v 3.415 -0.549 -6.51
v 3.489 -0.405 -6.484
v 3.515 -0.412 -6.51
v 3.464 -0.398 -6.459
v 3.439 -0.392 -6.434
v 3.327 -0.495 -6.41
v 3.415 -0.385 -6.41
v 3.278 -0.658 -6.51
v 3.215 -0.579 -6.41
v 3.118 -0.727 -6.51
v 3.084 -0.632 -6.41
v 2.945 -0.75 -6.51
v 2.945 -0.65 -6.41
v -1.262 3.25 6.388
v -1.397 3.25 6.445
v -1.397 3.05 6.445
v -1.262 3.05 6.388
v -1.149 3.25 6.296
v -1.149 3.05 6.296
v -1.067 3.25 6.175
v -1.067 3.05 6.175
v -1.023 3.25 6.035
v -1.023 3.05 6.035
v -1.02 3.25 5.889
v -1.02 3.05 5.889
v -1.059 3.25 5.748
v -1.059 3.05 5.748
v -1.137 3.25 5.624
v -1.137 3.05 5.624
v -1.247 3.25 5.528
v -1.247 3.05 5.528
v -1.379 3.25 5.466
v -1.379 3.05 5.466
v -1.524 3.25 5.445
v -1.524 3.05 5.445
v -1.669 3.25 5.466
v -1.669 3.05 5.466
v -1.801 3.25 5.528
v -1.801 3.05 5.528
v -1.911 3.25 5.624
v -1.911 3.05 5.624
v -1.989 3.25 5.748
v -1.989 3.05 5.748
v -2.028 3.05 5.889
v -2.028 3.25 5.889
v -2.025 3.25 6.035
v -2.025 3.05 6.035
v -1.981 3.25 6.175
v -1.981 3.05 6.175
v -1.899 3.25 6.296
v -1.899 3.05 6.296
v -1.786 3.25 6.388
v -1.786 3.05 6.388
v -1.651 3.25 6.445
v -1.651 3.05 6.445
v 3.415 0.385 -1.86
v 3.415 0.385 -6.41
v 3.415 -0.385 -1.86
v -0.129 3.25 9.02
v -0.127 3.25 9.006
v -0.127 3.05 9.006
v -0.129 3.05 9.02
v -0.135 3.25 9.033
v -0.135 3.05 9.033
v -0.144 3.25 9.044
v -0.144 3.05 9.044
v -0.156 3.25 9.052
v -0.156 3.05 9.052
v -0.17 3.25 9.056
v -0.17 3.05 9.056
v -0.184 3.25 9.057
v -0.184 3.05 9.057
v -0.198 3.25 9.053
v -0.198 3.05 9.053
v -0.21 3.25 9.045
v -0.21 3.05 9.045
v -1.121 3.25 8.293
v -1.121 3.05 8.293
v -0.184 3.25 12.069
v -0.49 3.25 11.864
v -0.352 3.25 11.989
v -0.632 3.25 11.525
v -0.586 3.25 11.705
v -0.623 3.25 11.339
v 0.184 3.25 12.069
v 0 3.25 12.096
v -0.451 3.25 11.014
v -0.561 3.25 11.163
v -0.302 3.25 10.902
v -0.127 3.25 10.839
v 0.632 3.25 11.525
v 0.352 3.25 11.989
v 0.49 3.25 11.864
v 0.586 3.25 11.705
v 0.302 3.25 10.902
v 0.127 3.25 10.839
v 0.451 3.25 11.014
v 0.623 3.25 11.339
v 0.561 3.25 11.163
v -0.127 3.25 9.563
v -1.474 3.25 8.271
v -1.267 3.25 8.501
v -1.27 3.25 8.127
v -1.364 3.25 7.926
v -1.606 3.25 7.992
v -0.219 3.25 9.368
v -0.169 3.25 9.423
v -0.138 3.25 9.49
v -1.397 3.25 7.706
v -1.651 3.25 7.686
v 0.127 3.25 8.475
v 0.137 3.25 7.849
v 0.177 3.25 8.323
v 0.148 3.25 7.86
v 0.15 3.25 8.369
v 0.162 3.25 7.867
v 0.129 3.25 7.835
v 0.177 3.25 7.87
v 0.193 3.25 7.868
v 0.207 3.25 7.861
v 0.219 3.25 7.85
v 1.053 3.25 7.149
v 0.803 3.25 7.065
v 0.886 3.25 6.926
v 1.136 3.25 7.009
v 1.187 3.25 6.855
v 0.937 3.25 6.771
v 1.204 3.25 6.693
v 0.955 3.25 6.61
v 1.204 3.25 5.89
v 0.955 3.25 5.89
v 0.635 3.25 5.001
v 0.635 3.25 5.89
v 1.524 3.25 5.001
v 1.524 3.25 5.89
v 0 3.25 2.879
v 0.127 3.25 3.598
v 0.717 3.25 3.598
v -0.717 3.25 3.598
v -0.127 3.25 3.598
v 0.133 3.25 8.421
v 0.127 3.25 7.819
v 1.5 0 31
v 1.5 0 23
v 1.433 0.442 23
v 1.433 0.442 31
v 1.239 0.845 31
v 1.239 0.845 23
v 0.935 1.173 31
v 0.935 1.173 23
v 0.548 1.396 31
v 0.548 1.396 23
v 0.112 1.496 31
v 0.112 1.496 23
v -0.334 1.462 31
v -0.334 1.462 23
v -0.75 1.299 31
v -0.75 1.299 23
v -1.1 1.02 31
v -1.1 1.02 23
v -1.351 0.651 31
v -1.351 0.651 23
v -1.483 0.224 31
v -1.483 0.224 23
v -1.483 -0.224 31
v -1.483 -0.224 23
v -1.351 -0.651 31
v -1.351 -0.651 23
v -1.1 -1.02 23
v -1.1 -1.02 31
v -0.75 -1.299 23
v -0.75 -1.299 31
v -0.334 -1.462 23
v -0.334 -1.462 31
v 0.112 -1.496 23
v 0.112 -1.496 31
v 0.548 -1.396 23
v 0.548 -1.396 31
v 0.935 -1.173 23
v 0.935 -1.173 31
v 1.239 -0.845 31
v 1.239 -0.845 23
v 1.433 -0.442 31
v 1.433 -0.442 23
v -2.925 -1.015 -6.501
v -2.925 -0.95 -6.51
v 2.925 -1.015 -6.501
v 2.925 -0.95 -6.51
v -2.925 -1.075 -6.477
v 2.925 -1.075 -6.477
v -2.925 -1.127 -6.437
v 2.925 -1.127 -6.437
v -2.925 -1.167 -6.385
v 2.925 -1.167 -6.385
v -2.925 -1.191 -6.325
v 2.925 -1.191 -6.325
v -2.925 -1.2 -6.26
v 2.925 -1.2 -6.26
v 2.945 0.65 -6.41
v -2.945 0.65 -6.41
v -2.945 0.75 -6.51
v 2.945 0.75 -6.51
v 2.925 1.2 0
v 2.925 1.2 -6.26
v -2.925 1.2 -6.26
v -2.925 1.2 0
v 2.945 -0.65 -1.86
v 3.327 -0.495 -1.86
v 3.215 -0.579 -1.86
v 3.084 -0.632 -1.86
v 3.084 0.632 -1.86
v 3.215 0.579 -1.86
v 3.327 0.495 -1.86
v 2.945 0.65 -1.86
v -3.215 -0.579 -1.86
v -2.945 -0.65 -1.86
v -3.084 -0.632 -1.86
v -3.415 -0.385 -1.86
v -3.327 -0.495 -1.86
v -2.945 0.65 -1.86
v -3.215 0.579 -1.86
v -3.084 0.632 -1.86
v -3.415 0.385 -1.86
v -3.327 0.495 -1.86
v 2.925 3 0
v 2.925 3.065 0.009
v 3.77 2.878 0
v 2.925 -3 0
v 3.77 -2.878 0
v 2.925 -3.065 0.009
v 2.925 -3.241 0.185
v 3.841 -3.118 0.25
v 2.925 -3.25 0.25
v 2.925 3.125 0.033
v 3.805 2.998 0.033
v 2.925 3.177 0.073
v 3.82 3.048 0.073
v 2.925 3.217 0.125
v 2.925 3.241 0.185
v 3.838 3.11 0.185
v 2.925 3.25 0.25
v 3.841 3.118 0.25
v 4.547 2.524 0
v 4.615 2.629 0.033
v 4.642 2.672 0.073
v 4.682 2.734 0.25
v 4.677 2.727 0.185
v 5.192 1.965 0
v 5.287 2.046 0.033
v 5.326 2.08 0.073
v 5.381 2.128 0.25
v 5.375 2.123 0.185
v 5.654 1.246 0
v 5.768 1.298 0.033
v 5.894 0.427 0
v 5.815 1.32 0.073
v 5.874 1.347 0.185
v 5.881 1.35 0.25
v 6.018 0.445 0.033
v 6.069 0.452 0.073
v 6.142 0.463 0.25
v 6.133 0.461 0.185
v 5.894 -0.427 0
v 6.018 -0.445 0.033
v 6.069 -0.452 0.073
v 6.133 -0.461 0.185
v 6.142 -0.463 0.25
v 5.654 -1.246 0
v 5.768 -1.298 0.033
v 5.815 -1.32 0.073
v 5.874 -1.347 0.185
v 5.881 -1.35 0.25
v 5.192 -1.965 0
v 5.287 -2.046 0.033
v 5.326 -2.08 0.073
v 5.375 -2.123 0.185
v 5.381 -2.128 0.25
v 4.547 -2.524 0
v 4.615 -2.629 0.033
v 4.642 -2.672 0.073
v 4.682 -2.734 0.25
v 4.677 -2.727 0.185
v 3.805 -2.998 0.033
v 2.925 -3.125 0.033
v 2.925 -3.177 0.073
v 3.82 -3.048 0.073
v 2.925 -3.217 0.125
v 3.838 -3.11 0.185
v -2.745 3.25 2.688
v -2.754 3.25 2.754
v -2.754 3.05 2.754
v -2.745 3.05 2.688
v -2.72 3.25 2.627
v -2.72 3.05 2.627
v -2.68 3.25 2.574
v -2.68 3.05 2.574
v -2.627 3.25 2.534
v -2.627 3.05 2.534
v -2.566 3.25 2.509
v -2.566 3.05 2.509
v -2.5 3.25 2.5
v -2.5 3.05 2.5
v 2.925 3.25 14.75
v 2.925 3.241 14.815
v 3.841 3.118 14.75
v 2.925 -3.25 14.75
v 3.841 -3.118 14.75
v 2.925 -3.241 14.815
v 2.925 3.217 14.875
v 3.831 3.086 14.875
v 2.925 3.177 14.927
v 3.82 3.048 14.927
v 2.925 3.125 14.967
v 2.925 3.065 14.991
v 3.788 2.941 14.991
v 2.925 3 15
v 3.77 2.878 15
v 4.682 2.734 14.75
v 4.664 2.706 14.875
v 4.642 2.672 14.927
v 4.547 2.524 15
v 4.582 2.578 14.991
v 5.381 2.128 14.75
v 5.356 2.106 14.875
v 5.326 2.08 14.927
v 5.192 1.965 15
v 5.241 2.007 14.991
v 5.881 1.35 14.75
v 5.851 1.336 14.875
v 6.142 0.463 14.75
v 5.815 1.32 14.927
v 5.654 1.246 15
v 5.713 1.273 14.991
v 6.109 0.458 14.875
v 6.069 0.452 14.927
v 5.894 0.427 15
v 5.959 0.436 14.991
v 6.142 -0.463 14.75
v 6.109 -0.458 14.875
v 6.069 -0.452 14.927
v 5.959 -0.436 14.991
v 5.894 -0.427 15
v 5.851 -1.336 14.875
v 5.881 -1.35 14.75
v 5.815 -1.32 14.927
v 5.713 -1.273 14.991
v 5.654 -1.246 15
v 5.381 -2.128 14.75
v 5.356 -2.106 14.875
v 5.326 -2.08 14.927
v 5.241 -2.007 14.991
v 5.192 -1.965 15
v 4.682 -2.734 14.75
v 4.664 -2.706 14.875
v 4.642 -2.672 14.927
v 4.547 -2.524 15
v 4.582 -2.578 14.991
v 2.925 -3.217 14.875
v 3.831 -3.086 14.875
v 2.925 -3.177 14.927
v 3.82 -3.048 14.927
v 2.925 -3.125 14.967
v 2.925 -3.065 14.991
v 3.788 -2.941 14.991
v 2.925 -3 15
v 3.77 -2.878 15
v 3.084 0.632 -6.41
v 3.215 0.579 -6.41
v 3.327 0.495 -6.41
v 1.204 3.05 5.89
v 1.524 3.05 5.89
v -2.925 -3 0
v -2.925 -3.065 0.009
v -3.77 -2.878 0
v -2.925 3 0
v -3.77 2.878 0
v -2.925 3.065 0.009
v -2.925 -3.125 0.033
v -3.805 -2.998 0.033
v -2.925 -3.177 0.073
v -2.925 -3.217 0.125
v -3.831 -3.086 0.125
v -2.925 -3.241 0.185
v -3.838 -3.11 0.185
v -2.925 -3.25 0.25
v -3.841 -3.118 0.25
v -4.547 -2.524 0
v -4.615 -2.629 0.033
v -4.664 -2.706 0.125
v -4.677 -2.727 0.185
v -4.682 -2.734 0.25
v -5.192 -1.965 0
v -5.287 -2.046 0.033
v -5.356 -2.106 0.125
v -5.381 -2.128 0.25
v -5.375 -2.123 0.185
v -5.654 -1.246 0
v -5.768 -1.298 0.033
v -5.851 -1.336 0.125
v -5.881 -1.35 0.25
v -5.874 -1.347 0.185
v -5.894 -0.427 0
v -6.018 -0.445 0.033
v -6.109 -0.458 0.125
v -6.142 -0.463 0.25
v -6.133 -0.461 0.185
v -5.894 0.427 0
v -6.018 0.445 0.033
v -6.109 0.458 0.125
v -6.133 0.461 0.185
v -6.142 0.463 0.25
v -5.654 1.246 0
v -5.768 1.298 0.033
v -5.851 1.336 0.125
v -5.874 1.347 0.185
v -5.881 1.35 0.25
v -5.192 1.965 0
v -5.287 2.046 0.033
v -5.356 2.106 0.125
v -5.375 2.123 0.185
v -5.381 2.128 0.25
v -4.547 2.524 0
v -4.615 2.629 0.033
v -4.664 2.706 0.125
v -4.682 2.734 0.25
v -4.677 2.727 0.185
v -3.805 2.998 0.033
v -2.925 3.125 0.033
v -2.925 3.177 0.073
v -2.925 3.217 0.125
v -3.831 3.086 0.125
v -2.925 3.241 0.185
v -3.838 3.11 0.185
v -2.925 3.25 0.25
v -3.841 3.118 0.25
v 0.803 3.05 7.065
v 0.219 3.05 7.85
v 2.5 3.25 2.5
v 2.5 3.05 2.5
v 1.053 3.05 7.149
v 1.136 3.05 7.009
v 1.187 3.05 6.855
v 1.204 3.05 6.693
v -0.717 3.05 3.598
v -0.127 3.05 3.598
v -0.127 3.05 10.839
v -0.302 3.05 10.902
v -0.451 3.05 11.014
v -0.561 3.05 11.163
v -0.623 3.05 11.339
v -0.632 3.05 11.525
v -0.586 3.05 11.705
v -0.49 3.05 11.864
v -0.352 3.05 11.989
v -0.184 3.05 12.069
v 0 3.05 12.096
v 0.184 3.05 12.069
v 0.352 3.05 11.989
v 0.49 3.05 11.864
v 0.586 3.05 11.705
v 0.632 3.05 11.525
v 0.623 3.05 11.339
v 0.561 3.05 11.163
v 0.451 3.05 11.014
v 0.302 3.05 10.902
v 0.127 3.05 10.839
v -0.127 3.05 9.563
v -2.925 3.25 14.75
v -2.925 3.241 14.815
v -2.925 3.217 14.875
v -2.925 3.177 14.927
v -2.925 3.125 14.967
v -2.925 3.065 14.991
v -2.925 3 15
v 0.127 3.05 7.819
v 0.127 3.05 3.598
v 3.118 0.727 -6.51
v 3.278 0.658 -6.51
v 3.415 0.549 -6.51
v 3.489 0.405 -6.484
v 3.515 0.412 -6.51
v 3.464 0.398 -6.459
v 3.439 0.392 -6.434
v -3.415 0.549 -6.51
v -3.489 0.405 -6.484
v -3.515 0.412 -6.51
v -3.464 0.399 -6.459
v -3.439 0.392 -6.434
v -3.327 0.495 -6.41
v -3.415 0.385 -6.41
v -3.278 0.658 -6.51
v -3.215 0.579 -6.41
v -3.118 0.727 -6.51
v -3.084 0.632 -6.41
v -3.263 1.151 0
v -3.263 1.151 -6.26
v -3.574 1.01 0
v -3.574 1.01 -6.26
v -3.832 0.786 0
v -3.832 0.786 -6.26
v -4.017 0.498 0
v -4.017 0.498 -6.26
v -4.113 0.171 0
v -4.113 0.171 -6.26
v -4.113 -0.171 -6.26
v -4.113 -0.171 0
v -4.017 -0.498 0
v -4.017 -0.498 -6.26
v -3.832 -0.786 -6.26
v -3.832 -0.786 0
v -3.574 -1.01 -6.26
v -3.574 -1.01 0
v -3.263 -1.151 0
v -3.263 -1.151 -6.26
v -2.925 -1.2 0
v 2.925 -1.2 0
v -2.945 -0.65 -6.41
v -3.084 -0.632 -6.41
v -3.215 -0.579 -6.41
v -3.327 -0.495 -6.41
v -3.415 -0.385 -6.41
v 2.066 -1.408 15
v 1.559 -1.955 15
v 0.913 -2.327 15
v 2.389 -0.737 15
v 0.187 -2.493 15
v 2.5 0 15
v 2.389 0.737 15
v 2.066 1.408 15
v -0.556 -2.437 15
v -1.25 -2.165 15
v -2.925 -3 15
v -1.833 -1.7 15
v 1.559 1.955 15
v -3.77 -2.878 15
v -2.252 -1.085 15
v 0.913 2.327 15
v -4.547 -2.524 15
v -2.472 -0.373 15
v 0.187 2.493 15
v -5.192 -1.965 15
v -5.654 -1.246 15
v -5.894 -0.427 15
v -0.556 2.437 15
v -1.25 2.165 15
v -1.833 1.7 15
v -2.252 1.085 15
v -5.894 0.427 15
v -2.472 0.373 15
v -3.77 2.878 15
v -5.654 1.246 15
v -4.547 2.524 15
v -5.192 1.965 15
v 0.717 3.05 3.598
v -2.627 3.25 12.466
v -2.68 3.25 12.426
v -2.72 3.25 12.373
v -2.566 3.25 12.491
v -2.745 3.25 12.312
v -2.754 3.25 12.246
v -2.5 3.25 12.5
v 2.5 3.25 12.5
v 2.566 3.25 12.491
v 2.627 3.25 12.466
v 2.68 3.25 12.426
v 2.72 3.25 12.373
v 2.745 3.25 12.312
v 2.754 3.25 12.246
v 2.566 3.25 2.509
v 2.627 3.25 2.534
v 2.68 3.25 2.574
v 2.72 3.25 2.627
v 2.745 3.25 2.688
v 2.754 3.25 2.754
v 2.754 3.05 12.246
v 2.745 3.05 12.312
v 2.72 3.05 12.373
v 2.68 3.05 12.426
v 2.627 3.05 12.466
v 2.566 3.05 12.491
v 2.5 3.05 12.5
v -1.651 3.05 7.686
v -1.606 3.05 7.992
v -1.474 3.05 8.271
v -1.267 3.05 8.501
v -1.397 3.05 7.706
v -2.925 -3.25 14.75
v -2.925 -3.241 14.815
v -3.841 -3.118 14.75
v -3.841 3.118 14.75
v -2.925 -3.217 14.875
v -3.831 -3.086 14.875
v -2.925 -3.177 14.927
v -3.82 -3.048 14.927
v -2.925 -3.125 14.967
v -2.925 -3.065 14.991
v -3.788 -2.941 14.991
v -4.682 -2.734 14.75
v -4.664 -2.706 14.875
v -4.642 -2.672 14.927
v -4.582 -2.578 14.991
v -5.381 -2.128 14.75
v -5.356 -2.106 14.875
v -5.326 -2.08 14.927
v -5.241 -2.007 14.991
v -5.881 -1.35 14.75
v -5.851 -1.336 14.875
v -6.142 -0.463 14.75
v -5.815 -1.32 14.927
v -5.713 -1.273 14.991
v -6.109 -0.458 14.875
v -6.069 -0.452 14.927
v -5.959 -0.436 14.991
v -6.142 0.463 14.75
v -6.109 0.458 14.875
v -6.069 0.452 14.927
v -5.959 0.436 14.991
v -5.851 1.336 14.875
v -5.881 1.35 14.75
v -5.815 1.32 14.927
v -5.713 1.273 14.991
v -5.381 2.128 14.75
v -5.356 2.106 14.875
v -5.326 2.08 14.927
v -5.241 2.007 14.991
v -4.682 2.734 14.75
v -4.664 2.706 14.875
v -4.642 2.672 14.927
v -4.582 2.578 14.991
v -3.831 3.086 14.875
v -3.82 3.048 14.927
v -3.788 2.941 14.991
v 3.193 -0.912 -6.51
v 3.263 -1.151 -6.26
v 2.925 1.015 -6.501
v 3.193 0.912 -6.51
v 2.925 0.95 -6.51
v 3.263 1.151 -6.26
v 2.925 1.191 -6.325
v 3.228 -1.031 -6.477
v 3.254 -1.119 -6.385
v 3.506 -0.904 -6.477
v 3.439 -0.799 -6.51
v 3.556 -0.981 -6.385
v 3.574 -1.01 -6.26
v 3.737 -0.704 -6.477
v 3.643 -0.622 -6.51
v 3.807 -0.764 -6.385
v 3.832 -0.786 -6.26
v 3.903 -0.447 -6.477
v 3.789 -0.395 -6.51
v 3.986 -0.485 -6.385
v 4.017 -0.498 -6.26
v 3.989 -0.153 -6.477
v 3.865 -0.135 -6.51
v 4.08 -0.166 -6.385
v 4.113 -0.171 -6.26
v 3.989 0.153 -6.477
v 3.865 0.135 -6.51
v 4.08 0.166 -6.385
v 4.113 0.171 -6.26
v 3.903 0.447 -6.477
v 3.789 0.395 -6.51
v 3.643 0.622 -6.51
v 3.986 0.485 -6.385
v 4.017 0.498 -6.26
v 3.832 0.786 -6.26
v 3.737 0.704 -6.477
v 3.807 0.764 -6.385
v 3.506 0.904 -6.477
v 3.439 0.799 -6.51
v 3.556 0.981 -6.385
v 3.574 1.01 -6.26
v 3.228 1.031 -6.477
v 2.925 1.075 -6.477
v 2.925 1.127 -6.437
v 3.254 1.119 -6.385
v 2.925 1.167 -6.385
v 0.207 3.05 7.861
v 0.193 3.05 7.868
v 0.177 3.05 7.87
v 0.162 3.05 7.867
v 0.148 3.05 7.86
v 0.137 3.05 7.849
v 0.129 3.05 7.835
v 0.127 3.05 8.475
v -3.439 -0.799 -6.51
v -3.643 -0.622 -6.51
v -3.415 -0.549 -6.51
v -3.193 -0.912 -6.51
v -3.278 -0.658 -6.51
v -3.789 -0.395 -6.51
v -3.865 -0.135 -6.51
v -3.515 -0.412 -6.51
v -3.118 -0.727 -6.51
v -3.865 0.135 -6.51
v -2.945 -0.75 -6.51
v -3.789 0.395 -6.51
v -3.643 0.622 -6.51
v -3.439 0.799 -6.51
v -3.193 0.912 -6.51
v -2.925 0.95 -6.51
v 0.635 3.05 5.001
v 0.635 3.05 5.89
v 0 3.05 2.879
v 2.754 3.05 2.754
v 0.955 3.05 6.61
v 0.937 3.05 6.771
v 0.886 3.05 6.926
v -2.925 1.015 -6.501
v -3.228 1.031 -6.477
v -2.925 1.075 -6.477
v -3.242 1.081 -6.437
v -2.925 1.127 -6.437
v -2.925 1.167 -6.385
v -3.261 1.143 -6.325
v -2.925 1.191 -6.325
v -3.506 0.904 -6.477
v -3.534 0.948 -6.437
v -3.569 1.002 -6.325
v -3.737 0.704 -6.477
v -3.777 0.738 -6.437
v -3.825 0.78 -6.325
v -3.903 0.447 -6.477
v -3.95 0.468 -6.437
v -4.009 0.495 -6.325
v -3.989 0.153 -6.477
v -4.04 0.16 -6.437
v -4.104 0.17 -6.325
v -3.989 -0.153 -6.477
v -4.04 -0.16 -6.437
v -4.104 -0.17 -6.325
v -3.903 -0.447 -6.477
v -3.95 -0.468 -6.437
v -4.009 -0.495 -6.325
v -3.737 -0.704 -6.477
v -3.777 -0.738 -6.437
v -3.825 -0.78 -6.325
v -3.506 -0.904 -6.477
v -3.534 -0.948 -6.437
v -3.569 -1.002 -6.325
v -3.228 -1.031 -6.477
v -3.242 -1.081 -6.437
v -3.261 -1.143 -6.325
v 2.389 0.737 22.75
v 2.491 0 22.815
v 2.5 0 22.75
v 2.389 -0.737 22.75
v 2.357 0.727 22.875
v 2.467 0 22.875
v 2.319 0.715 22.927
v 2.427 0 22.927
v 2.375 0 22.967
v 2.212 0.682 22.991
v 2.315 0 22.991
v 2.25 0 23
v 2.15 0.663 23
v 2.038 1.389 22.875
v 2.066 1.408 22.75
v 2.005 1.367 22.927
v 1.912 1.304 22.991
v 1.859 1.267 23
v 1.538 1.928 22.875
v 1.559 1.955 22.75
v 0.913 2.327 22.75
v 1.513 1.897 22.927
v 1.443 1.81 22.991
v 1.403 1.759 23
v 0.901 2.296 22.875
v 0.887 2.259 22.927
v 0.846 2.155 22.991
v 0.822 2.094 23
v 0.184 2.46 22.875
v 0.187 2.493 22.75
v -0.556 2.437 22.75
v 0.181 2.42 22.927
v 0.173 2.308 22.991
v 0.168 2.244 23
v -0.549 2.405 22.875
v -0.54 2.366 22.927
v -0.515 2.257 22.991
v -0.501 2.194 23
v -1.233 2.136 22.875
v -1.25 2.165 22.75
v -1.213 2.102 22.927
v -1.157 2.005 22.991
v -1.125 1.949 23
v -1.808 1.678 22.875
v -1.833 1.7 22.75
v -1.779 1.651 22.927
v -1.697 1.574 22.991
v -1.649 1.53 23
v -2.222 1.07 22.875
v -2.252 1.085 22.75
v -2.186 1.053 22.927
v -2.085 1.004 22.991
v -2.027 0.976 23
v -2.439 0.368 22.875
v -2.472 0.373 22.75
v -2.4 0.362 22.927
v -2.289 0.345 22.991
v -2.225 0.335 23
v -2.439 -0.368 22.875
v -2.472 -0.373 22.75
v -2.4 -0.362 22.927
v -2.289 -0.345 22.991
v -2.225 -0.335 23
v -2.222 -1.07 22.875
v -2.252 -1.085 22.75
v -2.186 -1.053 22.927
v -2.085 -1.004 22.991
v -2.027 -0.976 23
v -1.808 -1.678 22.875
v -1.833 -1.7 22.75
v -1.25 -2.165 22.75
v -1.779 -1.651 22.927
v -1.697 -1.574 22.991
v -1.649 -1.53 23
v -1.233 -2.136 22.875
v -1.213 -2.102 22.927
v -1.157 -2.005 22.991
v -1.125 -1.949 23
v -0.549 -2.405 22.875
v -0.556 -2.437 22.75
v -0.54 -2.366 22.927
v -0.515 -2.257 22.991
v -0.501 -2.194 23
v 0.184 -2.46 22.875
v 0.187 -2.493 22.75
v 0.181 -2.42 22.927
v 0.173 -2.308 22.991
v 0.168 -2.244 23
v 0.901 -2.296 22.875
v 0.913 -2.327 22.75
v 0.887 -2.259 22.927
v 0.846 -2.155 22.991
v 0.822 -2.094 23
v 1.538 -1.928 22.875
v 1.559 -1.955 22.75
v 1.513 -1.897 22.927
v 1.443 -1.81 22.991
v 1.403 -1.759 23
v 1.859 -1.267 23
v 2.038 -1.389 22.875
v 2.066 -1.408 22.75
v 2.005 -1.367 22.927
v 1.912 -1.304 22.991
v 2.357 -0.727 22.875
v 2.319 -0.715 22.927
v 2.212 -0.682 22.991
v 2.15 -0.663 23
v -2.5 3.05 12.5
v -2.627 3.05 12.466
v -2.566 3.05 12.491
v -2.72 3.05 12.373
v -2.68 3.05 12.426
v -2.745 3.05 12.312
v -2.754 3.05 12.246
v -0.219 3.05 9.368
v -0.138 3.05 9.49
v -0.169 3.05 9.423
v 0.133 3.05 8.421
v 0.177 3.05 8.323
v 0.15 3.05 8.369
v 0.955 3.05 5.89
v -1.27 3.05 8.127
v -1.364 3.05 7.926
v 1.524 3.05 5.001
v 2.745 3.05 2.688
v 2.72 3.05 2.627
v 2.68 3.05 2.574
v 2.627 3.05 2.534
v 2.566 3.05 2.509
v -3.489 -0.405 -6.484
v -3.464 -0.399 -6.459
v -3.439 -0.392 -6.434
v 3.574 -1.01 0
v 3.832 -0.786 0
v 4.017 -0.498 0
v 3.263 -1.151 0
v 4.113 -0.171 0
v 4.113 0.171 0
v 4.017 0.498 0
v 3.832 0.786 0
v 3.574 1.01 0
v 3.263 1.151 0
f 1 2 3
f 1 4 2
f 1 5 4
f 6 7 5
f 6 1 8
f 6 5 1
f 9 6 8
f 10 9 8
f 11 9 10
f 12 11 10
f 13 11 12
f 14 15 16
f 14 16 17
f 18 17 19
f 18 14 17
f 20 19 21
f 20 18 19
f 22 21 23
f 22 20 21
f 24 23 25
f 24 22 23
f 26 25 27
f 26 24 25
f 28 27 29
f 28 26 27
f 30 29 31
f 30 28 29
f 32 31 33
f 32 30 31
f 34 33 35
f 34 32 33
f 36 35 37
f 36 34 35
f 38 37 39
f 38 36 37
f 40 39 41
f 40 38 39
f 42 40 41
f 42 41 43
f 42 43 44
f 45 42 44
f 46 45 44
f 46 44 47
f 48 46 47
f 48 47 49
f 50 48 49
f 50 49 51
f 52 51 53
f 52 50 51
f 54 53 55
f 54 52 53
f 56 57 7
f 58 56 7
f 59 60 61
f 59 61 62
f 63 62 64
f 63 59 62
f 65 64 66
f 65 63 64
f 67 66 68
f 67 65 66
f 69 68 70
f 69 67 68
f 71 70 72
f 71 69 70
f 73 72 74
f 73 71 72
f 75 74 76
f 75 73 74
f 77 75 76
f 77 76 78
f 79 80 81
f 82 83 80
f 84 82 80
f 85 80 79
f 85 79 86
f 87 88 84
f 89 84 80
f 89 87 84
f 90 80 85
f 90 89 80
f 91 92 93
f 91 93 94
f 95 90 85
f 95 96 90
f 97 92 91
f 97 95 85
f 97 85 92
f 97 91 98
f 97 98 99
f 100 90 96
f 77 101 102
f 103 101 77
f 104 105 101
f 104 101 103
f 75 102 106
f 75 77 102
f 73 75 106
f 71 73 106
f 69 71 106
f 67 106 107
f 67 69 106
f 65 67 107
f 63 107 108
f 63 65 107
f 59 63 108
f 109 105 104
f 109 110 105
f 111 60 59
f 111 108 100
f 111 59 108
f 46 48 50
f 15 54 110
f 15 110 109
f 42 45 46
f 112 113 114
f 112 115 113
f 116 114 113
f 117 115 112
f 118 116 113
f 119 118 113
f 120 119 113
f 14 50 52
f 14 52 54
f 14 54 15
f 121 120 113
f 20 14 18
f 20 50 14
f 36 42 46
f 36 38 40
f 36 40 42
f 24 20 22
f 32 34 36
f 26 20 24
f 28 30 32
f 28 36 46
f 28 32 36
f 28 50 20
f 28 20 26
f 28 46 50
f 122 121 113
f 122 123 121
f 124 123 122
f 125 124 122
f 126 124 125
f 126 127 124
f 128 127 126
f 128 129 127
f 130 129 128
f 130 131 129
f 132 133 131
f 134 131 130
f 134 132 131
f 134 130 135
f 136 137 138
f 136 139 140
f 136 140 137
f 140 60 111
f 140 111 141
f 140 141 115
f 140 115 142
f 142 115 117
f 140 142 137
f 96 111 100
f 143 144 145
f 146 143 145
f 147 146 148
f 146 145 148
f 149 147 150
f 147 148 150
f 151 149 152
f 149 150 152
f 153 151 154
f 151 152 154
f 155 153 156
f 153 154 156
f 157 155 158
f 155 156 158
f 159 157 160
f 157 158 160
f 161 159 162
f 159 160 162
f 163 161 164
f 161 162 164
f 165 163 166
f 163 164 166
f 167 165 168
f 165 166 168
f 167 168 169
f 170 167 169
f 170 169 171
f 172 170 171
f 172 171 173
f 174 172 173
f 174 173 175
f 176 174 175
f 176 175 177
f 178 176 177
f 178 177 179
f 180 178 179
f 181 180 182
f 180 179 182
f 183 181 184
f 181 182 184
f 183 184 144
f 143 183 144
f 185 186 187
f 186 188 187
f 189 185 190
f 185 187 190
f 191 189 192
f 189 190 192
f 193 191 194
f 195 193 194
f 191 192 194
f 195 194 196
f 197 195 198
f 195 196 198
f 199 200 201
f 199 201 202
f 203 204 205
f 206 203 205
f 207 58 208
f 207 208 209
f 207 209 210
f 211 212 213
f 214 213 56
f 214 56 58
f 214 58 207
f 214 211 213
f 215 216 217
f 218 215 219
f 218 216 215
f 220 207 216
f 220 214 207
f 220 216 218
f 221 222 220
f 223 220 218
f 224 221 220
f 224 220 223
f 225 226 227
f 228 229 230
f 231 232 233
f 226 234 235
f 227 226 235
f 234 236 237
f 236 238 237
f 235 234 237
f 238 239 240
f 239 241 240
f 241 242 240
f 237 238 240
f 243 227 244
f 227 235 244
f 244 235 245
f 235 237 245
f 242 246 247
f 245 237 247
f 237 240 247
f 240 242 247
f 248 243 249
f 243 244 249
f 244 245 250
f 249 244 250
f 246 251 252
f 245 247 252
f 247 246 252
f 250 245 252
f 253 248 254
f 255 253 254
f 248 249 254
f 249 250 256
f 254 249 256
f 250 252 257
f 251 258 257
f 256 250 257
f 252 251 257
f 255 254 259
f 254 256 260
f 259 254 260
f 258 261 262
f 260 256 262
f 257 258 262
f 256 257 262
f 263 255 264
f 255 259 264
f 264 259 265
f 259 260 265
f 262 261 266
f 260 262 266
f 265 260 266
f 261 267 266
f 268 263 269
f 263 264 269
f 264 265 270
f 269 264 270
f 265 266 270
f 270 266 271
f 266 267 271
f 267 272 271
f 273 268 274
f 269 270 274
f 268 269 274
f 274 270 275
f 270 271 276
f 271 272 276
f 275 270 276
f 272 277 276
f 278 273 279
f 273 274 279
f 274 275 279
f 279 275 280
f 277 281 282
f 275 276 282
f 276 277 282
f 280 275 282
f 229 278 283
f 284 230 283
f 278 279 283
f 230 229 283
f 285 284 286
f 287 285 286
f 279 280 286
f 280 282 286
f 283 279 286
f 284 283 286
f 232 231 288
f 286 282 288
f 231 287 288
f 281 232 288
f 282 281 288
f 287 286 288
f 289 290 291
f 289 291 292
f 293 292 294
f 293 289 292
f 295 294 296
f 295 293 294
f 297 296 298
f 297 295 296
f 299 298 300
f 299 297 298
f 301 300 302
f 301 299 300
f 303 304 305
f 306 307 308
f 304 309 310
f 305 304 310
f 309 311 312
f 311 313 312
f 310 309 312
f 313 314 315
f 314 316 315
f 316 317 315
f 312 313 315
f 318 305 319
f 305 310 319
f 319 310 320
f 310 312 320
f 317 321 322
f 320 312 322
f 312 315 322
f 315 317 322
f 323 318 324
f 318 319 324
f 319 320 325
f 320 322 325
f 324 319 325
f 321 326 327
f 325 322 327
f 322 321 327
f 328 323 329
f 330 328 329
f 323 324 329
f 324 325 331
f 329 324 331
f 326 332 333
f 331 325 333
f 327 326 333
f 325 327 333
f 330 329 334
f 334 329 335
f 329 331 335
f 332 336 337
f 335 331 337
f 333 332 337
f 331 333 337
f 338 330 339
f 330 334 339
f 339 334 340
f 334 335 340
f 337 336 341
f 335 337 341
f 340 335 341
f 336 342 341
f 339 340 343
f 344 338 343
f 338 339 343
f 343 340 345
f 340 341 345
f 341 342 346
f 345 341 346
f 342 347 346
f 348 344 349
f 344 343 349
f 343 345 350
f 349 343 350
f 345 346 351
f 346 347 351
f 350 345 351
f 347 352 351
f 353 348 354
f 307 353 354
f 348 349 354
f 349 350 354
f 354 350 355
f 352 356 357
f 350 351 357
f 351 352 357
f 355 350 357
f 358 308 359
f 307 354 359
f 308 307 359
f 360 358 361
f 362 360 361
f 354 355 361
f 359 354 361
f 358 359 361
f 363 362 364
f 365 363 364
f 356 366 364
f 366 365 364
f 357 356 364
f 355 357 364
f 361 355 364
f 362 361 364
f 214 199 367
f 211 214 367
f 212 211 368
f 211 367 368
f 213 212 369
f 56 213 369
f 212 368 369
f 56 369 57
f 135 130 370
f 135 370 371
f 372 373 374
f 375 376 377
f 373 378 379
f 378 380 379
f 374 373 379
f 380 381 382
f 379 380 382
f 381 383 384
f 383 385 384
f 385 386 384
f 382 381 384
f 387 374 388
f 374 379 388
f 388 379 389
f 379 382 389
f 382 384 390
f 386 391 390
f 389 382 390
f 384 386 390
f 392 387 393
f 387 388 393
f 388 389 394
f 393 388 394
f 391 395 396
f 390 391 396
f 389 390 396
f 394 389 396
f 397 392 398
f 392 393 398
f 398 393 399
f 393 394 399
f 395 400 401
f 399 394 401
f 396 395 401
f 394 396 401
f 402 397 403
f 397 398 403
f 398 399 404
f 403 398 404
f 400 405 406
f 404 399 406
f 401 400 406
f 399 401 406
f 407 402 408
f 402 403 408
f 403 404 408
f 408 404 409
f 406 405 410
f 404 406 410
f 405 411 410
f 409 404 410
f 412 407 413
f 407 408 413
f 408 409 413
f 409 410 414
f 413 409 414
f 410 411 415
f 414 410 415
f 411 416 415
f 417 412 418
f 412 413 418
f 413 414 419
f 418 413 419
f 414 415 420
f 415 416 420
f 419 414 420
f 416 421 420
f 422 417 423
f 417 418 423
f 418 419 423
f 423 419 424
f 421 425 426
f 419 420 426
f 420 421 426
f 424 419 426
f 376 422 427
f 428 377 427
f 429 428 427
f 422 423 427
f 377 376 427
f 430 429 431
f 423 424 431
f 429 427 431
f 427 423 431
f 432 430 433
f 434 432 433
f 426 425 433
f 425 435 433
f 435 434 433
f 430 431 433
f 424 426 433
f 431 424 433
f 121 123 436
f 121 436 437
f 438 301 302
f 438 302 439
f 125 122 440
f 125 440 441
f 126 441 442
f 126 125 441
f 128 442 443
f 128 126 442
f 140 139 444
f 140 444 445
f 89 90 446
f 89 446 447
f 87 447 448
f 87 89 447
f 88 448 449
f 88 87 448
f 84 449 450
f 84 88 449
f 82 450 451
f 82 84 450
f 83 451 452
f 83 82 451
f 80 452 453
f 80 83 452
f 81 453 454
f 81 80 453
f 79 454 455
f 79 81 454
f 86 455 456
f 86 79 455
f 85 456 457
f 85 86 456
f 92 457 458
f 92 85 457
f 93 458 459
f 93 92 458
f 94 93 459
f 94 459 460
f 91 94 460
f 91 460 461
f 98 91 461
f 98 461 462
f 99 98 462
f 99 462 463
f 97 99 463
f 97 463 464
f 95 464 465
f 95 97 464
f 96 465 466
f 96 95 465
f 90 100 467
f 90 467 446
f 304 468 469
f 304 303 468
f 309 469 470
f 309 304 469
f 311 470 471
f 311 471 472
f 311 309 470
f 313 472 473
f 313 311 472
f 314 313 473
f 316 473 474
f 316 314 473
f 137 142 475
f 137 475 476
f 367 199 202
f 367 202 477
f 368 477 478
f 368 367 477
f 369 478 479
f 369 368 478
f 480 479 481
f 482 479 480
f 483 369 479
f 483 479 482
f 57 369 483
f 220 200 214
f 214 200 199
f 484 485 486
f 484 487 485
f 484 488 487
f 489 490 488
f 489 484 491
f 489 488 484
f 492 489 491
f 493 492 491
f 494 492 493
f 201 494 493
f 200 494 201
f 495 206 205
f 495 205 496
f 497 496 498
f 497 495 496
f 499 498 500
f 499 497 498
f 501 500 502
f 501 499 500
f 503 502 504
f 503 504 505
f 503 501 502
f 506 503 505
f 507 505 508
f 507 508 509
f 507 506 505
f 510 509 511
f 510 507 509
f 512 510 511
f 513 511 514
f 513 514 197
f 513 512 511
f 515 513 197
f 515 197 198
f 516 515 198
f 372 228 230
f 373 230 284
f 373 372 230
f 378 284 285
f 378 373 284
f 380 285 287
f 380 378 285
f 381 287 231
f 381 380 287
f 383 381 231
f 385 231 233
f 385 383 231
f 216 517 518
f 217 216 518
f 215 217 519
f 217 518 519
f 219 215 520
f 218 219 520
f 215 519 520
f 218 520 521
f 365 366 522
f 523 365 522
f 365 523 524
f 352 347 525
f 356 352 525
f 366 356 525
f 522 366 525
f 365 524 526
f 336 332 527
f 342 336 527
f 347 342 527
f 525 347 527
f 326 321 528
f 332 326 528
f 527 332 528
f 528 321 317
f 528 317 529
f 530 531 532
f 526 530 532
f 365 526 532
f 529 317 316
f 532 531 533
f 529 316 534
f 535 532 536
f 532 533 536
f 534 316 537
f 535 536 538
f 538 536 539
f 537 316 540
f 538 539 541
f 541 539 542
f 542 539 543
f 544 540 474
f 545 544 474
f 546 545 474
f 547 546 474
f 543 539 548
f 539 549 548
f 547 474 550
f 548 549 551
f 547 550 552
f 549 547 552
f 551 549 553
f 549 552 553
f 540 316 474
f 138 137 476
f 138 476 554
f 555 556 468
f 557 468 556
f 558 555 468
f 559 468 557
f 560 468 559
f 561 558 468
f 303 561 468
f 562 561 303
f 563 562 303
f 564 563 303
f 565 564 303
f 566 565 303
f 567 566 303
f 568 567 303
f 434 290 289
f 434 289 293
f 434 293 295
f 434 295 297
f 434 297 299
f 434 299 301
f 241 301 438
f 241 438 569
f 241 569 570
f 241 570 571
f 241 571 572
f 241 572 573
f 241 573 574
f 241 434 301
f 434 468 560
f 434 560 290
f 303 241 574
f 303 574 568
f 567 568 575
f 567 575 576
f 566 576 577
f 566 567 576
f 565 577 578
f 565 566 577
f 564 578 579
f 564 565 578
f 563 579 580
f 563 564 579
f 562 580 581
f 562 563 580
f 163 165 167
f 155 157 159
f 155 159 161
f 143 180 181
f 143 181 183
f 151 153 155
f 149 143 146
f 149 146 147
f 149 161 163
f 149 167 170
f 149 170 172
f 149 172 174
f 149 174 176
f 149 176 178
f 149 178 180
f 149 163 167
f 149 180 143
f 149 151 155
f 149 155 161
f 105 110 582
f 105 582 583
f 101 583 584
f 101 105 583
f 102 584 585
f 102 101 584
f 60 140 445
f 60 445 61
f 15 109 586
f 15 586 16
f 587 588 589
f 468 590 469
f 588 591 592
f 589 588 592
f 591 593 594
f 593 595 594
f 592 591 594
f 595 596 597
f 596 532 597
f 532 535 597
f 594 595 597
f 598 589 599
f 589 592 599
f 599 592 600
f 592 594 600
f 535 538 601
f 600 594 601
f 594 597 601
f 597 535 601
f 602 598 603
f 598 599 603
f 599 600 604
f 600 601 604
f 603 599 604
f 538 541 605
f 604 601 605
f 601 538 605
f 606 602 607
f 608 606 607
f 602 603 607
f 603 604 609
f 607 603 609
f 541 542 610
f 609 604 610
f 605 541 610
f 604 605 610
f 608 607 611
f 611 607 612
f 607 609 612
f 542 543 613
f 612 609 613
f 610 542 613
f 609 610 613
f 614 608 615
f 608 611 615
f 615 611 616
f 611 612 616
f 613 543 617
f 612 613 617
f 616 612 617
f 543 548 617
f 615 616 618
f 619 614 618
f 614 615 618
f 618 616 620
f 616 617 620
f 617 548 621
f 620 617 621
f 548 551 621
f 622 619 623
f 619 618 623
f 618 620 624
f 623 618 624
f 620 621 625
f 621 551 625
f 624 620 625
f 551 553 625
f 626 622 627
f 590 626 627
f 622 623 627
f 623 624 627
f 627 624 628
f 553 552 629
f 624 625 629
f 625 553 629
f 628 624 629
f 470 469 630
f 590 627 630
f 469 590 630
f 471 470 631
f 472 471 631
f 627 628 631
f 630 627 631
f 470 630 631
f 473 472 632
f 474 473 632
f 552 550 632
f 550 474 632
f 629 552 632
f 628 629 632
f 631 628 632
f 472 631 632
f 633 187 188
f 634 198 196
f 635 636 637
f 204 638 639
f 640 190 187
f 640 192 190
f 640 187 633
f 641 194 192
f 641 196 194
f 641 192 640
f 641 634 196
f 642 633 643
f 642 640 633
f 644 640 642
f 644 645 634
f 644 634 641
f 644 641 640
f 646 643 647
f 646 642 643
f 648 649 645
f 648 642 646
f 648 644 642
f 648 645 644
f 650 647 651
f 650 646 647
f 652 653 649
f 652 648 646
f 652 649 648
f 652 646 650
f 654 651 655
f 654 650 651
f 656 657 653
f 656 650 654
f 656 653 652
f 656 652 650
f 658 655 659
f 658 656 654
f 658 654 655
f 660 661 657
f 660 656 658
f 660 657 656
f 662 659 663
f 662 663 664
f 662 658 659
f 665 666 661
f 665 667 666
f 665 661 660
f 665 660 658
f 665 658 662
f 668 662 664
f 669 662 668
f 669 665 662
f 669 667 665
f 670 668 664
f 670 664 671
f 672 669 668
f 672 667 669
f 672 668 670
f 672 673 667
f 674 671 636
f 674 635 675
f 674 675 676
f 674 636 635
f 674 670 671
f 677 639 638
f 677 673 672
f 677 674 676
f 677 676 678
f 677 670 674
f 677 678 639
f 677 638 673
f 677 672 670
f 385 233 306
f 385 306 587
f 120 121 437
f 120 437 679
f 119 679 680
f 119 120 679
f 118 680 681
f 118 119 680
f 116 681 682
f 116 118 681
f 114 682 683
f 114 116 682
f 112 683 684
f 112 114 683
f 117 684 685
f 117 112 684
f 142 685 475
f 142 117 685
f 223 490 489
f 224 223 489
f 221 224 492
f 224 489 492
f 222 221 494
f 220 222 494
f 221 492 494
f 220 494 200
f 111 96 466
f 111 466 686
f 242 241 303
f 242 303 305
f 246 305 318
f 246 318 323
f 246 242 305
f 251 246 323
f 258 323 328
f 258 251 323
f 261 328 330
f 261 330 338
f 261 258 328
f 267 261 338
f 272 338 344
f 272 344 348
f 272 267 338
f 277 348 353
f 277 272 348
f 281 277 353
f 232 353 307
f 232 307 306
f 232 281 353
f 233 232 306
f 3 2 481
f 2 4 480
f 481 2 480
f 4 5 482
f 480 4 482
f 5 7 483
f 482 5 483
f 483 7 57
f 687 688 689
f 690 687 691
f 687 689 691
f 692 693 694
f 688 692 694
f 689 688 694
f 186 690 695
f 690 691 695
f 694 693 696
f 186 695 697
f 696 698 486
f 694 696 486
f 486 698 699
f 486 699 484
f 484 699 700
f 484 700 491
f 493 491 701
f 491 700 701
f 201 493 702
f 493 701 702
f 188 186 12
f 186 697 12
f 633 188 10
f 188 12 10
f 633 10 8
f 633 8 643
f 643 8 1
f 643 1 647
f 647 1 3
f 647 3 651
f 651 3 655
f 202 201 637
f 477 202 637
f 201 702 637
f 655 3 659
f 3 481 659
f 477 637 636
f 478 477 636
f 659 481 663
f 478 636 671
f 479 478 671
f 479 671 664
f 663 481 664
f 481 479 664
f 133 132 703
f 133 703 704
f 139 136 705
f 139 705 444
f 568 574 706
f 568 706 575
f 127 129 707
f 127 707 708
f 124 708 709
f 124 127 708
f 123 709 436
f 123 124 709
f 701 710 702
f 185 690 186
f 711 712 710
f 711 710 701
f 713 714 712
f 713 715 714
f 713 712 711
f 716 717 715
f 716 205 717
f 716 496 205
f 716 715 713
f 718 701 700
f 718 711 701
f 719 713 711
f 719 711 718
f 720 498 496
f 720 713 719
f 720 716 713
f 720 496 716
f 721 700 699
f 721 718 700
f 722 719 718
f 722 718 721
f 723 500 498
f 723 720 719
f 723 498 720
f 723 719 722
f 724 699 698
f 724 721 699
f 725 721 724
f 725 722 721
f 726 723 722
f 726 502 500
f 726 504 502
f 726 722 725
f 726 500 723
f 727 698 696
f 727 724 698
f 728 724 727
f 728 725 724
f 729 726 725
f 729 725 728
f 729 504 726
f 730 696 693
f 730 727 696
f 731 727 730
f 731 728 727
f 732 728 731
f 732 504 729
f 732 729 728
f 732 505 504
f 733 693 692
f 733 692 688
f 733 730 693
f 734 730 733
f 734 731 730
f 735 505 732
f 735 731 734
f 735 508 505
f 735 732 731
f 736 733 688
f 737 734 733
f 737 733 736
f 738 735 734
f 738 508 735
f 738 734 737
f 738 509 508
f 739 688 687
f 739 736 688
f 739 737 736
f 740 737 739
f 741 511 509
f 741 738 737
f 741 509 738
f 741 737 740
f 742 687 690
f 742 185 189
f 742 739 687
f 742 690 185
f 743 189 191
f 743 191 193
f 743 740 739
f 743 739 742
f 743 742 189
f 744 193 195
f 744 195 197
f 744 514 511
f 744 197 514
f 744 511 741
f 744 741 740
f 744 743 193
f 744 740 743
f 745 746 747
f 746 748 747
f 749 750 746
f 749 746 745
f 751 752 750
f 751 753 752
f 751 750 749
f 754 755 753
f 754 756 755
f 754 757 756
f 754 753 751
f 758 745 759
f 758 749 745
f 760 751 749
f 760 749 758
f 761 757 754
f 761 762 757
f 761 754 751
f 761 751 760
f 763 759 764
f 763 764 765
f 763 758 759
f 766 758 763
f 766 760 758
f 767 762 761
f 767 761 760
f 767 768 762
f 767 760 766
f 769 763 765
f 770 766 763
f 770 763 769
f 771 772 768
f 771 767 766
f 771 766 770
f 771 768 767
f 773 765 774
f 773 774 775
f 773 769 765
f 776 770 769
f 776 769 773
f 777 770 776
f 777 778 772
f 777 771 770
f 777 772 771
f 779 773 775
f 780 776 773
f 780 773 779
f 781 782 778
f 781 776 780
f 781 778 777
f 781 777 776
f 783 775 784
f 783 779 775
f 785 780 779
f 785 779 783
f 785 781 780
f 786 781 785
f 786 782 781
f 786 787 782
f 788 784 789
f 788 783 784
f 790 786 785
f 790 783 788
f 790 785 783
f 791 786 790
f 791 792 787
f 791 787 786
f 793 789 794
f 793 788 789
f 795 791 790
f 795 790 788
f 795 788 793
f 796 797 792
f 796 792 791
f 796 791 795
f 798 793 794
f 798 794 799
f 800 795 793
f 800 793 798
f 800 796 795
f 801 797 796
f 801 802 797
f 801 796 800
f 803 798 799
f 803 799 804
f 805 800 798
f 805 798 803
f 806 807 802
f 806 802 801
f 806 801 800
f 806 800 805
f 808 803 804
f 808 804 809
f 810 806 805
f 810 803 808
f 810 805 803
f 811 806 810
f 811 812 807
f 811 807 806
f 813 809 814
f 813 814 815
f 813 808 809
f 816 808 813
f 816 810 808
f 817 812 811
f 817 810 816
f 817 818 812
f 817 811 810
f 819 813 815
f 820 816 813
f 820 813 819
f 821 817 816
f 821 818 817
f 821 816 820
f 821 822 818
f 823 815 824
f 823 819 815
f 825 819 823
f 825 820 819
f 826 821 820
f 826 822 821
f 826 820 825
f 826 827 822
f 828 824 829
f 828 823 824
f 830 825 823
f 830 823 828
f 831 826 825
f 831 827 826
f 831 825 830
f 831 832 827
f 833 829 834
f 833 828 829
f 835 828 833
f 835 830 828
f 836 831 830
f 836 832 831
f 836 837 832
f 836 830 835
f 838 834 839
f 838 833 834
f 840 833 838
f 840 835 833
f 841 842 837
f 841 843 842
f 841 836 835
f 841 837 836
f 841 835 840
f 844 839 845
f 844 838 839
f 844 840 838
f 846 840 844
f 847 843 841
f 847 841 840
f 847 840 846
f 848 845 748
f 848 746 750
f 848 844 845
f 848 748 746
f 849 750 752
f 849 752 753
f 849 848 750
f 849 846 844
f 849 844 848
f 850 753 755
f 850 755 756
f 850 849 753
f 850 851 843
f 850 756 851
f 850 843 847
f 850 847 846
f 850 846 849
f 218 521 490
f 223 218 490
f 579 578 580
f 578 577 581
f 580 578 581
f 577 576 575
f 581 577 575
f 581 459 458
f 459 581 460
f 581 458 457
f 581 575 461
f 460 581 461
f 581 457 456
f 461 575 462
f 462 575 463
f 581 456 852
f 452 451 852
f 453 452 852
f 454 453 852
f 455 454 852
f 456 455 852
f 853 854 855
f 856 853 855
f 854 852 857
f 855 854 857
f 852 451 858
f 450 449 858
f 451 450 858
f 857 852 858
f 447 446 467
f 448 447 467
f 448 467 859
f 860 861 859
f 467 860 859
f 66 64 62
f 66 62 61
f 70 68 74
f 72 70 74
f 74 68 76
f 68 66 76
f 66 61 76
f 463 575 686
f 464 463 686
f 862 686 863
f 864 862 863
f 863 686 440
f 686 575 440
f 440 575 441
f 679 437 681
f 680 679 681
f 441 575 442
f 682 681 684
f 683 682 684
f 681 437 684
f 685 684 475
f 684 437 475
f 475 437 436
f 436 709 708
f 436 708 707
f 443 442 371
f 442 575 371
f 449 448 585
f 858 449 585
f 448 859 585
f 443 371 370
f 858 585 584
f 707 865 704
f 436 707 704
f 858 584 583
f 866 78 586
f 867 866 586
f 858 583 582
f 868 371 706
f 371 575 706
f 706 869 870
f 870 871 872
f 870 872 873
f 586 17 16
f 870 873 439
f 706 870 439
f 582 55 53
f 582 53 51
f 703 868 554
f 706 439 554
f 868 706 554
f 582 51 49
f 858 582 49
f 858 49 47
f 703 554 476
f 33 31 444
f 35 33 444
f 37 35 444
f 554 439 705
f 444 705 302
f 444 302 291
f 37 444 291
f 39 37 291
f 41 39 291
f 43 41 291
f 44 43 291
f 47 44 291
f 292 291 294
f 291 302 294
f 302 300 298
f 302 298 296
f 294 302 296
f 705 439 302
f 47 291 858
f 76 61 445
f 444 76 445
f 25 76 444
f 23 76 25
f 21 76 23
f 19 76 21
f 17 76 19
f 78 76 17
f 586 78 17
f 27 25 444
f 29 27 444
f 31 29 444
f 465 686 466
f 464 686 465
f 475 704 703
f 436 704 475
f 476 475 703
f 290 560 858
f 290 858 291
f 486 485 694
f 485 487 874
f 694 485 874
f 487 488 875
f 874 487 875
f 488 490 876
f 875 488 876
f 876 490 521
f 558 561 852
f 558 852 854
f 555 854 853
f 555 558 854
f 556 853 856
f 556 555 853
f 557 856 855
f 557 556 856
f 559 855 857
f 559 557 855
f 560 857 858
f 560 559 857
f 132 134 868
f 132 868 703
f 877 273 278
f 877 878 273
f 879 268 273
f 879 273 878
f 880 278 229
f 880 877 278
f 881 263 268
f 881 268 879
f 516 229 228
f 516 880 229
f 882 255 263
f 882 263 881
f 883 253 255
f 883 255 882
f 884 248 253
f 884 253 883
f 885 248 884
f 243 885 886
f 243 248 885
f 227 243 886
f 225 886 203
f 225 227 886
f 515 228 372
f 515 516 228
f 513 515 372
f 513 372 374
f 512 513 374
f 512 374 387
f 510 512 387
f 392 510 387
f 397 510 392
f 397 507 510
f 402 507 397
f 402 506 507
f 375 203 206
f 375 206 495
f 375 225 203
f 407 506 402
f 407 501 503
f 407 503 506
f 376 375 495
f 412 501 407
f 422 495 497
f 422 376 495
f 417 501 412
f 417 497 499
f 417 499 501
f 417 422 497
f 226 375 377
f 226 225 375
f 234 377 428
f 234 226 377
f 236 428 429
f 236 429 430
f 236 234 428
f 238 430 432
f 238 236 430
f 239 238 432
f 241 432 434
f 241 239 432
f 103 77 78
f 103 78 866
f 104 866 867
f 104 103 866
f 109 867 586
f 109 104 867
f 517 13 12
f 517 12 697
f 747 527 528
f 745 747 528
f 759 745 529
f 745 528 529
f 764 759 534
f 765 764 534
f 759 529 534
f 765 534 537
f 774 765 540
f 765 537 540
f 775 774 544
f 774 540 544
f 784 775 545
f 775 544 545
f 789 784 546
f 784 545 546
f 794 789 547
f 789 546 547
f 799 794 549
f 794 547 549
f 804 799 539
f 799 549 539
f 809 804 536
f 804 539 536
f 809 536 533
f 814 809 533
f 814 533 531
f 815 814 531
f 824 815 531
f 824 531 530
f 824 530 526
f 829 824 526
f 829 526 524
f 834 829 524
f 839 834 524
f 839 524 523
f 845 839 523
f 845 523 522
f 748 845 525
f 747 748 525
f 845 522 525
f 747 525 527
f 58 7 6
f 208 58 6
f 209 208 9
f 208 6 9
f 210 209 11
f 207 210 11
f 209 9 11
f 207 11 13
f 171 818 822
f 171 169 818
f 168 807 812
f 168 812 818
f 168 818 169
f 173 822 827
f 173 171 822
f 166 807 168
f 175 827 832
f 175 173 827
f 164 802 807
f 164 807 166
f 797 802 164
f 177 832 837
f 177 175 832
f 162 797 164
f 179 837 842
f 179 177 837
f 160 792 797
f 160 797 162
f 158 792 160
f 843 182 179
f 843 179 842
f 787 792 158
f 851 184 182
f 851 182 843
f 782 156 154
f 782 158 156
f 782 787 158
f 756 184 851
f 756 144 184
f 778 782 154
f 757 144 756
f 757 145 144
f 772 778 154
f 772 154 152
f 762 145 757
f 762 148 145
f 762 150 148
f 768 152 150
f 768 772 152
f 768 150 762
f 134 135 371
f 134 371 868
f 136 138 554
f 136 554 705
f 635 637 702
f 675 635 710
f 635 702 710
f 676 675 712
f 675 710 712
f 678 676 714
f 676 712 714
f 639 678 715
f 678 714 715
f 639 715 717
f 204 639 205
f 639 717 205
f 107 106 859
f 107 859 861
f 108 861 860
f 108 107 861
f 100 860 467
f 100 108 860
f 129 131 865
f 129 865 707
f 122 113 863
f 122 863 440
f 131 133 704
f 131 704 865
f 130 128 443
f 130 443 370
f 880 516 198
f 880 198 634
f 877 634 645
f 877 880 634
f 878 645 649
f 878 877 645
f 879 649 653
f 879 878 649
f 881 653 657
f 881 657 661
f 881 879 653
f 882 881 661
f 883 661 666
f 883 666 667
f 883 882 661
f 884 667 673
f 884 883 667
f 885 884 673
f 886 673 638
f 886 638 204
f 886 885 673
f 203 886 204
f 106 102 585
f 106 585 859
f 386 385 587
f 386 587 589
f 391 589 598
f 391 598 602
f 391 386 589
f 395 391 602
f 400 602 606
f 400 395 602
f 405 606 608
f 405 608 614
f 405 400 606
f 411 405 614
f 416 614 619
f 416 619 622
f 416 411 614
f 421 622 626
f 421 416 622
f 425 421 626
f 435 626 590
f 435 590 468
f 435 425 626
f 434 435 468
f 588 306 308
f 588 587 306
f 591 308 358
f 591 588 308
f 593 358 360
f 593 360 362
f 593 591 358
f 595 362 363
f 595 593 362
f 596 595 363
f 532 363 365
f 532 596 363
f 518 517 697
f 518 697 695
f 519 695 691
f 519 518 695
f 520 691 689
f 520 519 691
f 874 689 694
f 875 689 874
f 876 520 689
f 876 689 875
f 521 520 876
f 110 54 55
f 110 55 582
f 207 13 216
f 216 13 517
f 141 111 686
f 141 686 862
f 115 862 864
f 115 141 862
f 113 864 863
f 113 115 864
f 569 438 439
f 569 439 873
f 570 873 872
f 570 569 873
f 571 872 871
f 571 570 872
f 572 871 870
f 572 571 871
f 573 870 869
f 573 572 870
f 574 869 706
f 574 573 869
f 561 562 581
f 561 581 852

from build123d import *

# Parameters (mm, degrees)
EXTRUDE_1_DEPTH     = 15
EXTRUDE_2_DEPTH     = 6.51
CUT_EXTRUDE_1_DEPTH = 4.65
CHAMFER_1_SIZE      = 0.1
FILLET_1_R          = 0.25
CUT_EXTRUDE_2_DEPTH = 0.2
SKETCH_5_R          = 2.5
EXTRUDE_3_DEPTH     = 8
FILLET_2_R          = 0.25
SKETCH_6_R          = 1.5
EXTRUDE_4_DEPTH     = 8


with BuildPart() as part:
    # Эскиз1 → Бобышка-Вытянуть1 (new body)
    with BuildSketch(Plane.XY):
        with BuildLine():
            Line((-2.925, 3.25), (2.925, 3.25))
            ThreePointArc((2.925, 3.25), (6.175, 0), (2.925, -3.25))
            Line((2.925, -3.25), (-2.925, -3.25))
            ThreePointArc((-2.925, -3.25), (-6.175, 0), (-2.925, 3.25))
        make_face()
    extrude(amount=EXTRUDE_1_DEPTH)

    # Эскиз2 → Бобышка-Вытянуть2 (add)
    with BuildSketch(Plane(origin=(0, 0, 0), x_dir=(-1, 0, 0), z_dir=(0, 0, -1))):
        with BuildLine():
            Line((-2.925, 1.2), (2.925, 1.2))
            ThreePointArc((2.925, 1.2), (4.125, 0), (2.925, -1.2))
            Line((2.925, -1.2), (-2.925, -1.2))
            ThreePointArc((-2.925, -1.2), (-4.125, 0), (-2.925, 1.2))
        make_face()
    extrude(amount=EXTRUDE_2_DEPTH)

    # Эскиз3 → Вырез-Вытянуть1 (cut)
    with BuildSketch(Plane(origin=(0, 0, -6.51), x_dir=(-1, 0, 0), z_dir=(0, 0, -1))):
        with BuildLine():
            Line((-2.944601233, -0.65), (2.944601233, -0.65))
            ThreePointArc((2.944601233, -0.65), (3.214554933, -0.579192028), (3.415, -0.385))
            Line((3.415, -0.385), (3.415, 0.385))
            ThreePointArc((3.415, 0.385), (3.214554933, 0.579192028), (2.944601233, 0.65))
            Line((2.944601233, 0.65), (-2.944601233, 0.65))
            ThreePointArc((-2.944601233, 0.65), (-3.214554933, 0.579192028), (-3.415, 0.385))
            Line((-3.415, 0.385), (-3.415, -0.385))
            ThreePointArc((-3.415, -0.385), (-3.214554933, -0.579192028), (-2.944601233, -0.65))
        make_face()
    extrude(amount=-CUT_EXTRUDE_1_DEPTH, mode=Mode.SUBTRACT)

    # Фаска1
    chamfer_1_edges = [part.edges().sort_by_distance(p)[0] for p in [
        (3.214554933, -0.579192028, -6.51),
        (-3.214554933, -0.579192028, -6.51),
        (0, -0.65, -6.51),
    ]]
    chamfer(chamfer_1_edges, length=CHAMFER_1_SIZE)
    chamfer_1_2_edges = [part.edges().sort_by_distance(p)[0] for p in [
        (3.214554933, 0.579192028, -6.51),
        (0, 0.65, -6.51),
        (-3.214554933, 0.579192028, -6.51),
    ]]
    chamfer(chamfer_1_2_edges, length=CHAMFER_1_SIZE)
    chamfer_1_3_edges = [part.edges().sort_by_distance(p)[0] for p in [
        (-3.415, 0, -6.51),
    ]]
    chamfer(chamfer_1_3_edges, length=CHAMFER_1_SIZE - 0.0001)  # a hair under: the kernel refuses the full size
    chamfer_1_4_edges = [part.edges().sort_by_distance(p)[0] for p in [
        (3.415, 0, -6.51),
    ]]
    chamfer(chamfer_1_4_edges, length=CHAMFER_1_SIZE)

    # Скругление1
    fillet_1_edges = [part.edges().sort_by_distance(p)[0] for p in [
        (4.125, 0, -6.51),
        (0, -1.2, -6.51),
        (-4.125, 0, -6.51),
        (0, 1.2, -6.51),
    ]]
    fillet(fillet_1_edges, radius=FILLET_1_R)

    # Эскиз4 → Вырез-Вытянуть2 (cut)
    with BuildSketch(Plane(origin=(0, 3.25, 0), x_dir=(1, 0, 0), z_dir=(0, 1, 0))):
        with BuildLine():
            Line((-2.5, -2.5), (2.5, -2.5))
            ThreePointArc((2.5, -2.5), (2.679605122, -2.574394878), (2.754, -2.754))
            Line((2.754, -2.754), (2.754, -12.246))
            ThreePointArc((2.754, -12.246), (2.679605122, -12.425605122), (2.5, -12.5))
            Line((2.5, -12.5), (-2.5, -12.5))
            ThreePointArc((-2.5, -12.5), (-2.679605122, -12.425605122), (-2.754, -12.246))
            Line((-2.754, -12.246), (-2.754, -2.754))
            ThreePointArc((-2.754, -2.754), (-2.679605122, -2.574394878), (-2.5, -2.5))
        make_face()
        with BuildLine():
            Line((0, -2.878550244), (-0.716956191, -3.598432054))
            Line((-0.716956191, -3.598432054), (-0.127, -3.598432054))
            Line((-0.127, -3.598432054), (-0.127, -9.006251958))
            ThreePointArc((-0.127, -9.006251958), (-0.156162493, -9.052213445), (-0.21016765, -9.045405185))
            Line((-0.21016765, -9.045405185), (-1.120514747, -8.292828766))
            ThreePointArc((-1.120514747, -8.292828766), (-1.324422308, -8.030092949), (-1.397, -7.705530349))
            Line((-1.397, -7.705530349), (-1.397, -6.445060748))
            ThreePointArc((-1.397, -6.445060748), (-1.524, -5.445191863), (-1.651, -6.445060748))
            Line((-1.651, -6.445060748), (-1.651, -7.68561956))
            ThreePointArc((-1.651, -7.68561956), (-1.550201428, -8.136384053), (-1.267007097, -8.501281232))
            Line((-1.267007097, -8.501281232), (-0.219161751, -9.367526318))
            ThreePointArc((-0.219161751, -9.367526318), (-0.151192564, -9.455104923), (-0.127, -9.563292457))
            Line((-0.127, -9.563292457), (-0.127, -10.838615444))
            ThreePointArc((-0.127, -10.838615444), (0, -12.095785839), (0.127, -10.838615444))
            Line((0.127, -10.838615444), (0.127, -8.47461517))
            ThreePointArc((0.127, -8.47461517), (0.139930568, -8.394605616), (0.177405738, -8.322742274))
            Line((0.177405738, -8.322742274), (1.053118903, -7.148798926))
            ThreePointArc((1.053118903, -7.148798926), (1.165544414, -6.933208901), (1.204336117, -6.693180239))
            Line((1.204336117, -6.693180239), (1.204336117, -5.889691863))
            Line((1.204336117, -5.889691863), (1.524, -5.889691863))
            Line((1.524, -5.889691863), (1.524, -5.000691863))
            Line((1.524, -5.000691863), (0.635, -5.000691863))
            Line((0.635, -5.000691863), (0.635, -5.889691863))
            Line((0.635, -5.889691863), (0.954663883, -5.889691863))
            Line((0.954663883, -5.889691863), (0.954663883, -6.609767291))
            ThreePointArc((0.954663883, -6.609767291), (0.915872181, -6.849795953), (0.80344667, -7.065385978))
            Line((0.80344667, -7.065385978), (0.218518852, -7.849515015))
            ThreePointArc((0.218518852, -7.849515015), (0.161798089, -7.867354322), (0.127, -7.819140435))
            Line((0.127, -7.819140435), (0.127, -3.598432054))
            Line((0.127, -3.598432054), (0.716956191, -3.598432054))
            Line((0.716956191, -3.598432054), (0, -2.878550244))
        make_face(mode=Mode.SUBTRACT)
    extrude(amount=-CUT_EXTRUDE_2_DEPTH, mode=Mode.SUBTRACT)

    # Эскиз5 → Бобышка-Вытянуть3 (add)
    with BuildSketch(Plane.XY.offset(15)):
        Circle(SKETCH_5_R)
    extrude(amount=EXTRUDE_3_DEPTH)

    # Скругление2
    fillet_2_edges = [part.edges().sort_by_distance(p)[0] for p in [
        (6.175, 0, 15),
        (0, 3.25, 15),
        (-2.5, 0, 23),
        (-6.175, 0, 15),
        (0, 3.25, 0),
        (6.175, 0, 0),
        (0, -3.25, 0),
        (-6.175, 0, 0),
        (0, -3.25, 15),
    ]]
    fillet(fillet_2_edges, radius=FILLET_2_R)

    # Эскиз6 → Бобышка-Вытянуть4 (add)
    with BuildSketch(Plane.XY.offset(23)):
        Circle(SKETCH_6_R)
    extrude(amount=EXTRUDE_4_DEPTH)


solid = part.part
